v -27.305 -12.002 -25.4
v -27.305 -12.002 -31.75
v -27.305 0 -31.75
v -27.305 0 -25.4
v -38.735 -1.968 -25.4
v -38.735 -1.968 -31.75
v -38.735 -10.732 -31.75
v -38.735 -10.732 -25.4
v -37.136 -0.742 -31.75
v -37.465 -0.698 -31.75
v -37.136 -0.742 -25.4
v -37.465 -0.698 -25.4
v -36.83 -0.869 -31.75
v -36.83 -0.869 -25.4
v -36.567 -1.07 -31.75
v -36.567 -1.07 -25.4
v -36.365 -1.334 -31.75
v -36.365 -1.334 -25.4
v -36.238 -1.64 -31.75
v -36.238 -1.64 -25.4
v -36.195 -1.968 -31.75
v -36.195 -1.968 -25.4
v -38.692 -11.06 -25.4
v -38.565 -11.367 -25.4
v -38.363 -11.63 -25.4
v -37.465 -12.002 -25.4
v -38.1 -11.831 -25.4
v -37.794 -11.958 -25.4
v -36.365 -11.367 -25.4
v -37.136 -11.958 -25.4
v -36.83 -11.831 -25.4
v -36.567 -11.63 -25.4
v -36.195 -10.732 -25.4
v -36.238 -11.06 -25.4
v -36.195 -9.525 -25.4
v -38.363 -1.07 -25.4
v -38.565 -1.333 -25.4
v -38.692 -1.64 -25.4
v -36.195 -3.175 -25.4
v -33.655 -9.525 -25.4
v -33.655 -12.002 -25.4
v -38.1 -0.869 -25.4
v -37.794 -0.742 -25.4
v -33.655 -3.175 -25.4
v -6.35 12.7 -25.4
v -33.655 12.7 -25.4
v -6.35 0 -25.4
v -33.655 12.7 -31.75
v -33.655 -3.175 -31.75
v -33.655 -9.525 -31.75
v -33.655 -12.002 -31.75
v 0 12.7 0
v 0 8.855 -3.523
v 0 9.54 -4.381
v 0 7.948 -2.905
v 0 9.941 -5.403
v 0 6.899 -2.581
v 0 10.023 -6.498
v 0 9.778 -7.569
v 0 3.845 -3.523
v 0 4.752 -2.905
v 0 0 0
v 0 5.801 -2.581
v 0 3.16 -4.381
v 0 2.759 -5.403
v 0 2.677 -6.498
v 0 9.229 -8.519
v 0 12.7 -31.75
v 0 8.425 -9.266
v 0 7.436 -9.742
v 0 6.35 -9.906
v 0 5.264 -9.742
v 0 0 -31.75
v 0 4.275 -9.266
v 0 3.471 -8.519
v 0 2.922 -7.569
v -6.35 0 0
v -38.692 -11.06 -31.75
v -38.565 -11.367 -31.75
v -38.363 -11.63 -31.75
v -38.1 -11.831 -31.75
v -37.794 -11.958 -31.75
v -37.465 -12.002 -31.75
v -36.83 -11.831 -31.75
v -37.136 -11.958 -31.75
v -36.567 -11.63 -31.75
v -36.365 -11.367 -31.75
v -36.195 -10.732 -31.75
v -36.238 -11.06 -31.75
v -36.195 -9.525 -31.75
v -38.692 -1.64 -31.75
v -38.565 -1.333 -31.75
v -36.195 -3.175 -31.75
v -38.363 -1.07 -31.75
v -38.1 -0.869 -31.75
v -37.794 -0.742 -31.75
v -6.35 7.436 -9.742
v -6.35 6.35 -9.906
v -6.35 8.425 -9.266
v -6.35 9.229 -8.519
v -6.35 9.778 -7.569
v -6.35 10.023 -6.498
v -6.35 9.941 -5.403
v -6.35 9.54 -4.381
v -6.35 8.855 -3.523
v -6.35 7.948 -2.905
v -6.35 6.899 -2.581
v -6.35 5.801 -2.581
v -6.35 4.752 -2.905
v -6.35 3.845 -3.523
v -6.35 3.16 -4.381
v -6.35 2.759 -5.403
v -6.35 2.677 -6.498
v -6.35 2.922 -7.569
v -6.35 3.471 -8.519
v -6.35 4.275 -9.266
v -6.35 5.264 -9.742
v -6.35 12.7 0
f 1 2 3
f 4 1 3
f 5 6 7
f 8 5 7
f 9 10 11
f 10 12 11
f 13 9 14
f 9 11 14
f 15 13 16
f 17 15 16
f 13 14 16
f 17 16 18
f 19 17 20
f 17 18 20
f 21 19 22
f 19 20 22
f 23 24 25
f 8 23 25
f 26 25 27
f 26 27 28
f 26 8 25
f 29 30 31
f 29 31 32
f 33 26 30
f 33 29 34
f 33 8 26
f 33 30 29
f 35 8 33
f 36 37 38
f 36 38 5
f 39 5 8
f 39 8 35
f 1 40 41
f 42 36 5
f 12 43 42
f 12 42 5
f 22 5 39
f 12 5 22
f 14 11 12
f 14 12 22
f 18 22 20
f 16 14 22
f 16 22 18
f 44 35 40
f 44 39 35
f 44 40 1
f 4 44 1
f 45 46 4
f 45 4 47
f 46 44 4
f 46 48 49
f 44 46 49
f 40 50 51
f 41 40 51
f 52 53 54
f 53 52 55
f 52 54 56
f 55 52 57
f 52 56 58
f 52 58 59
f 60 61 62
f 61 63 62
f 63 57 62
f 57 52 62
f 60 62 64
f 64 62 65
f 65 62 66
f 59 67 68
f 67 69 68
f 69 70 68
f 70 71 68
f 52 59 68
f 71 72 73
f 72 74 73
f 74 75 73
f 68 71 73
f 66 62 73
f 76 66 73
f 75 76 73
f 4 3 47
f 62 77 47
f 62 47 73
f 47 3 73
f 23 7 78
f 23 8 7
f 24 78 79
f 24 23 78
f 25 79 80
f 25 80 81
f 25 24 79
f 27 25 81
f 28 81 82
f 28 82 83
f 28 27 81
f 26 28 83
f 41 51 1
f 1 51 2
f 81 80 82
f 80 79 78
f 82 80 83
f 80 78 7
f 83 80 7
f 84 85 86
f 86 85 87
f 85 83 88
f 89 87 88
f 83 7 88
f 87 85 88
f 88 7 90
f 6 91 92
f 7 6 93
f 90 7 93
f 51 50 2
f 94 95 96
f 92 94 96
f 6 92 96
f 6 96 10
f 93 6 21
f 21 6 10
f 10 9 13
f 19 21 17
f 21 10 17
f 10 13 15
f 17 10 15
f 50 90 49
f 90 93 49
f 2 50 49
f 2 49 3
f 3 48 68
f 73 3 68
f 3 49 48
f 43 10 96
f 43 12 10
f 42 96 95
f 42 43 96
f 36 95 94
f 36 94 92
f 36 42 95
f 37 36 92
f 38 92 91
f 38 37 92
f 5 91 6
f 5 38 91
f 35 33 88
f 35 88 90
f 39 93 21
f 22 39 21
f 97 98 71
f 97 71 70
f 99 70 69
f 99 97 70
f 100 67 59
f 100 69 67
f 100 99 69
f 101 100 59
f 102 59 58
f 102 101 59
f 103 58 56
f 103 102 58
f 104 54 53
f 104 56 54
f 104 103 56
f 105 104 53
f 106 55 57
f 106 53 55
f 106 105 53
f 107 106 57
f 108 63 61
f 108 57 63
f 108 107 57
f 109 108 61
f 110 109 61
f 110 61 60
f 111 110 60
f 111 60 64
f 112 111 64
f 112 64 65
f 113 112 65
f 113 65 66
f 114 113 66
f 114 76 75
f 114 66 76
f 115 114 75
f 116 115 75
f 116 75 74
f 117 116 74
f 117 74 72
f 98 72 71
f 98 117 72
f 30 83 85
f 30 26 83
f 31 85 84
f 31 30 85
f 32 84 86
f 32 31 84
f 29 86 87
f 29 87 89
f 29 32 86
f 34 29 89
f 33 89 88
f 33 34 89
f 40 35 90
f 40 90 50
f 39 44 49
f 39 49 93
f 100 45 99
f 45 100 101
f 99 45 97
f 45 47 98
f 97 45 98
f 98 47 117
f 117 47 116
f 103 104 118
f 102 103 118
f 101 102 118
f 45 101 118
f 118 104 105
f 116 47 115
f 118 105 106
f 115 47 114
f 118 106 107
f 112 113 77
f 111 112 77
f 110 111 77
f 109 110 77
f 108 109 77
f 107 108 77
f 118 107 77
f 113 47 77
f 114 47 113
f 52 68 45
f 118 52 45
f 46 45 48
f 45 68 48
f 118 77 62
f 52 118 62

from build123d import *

# Parameters (mm, degrees)
BOSS_EXTRUDE1_DEPTH     = 12.7
BOSS_EXTRUDE2_DEPTH     = 6.35
FILLET1_R               = 1.27
FILLET2_R               = 1.27
CUT_EXTRUDE1_DEPTH      = 52.669649941
CUT_EXTRUDE1_DEPTH_BACK = 52.669649941
SKETCH5_R               = 3.683


with BuildPart() as part:
    # Sketch1 → Boss-Extrude1 (new body)
    with BuildSketch(Plane(origin=(0, 0, 0), x_dir=(1, 0, 0), z_dir=(0, 1, 0))):
        Polygon((0, 0), (0, 31.75), (-22.86, 31.75), (-22.86, 25.4), (-6.35, 25.4), (-6.35, 0), align=None)
    extrude(amount=BOSS_EXTRUDE1_DEPTH)

    # Sketch3 → Boss-Extrude2 (add)
    with BuildSketch(Plane(origin=(0, 0, -31.75), x_dir=(-1, 0, 0), z_dir=(0, 0, -1))):
        Polygon((22.86, 12.7), (33.655, 12.7), (33.655, -3.175), (36.195, -3.175), (36.195, -0.6985), (38.735, -0.6985), (38.735, -12.0015), (36.195, -12.0015), (36.195, -9.525), (33.655, -9.525), (33.655, -12.0015), (27.305, -12.0015), (27.305, 0), (22.86, 0), align=None)
    extrude(amount=-BOSS_EXTRUDE2_DEPTH)

    # Fillet1
    fillet1_edges = [part.edges().sort_by_distance(p)[0] for p in [
        (-36.195, -0.6985, -28.575),
    ]]
    fillet(fillet1_edges, radius=FILLET1_R)

    # Fillet2
    fillet2_edges = [part.edges().sort_by_distance(p)[0] for p in [
        (-36.195, -12.0015, -28.575),
        (-38.735, -12.0015, -28.575),
        (-38.735, -0.6985, -28.575),
    ]]
    fillet(fillet2_edges, radius=FILLET2_R - 0.0001)  # a hair under: the kernel refuses the full size

    # Sketch5 → Cut-Extrude1 (cut, two sides: drawn at the far end of the back side and taken through both)
    with BuildSketch(Plane(origin=(0, 0, 0), x_dir=(0, 0, -1), z_dir=(1, 0, 0)).offset(-CUT_EXTRUDE1_DEPTH_BACK)):
        with Locations((6.223, 6.35)):
            Circle(SKETCH5_R)
    extrude(amount=CUT_EXTRUDE1_DEPTH + CUT_EXTRUDE1_DEPTH_BACK, mode=Mode.SUBTRACT)


solid = part.part
